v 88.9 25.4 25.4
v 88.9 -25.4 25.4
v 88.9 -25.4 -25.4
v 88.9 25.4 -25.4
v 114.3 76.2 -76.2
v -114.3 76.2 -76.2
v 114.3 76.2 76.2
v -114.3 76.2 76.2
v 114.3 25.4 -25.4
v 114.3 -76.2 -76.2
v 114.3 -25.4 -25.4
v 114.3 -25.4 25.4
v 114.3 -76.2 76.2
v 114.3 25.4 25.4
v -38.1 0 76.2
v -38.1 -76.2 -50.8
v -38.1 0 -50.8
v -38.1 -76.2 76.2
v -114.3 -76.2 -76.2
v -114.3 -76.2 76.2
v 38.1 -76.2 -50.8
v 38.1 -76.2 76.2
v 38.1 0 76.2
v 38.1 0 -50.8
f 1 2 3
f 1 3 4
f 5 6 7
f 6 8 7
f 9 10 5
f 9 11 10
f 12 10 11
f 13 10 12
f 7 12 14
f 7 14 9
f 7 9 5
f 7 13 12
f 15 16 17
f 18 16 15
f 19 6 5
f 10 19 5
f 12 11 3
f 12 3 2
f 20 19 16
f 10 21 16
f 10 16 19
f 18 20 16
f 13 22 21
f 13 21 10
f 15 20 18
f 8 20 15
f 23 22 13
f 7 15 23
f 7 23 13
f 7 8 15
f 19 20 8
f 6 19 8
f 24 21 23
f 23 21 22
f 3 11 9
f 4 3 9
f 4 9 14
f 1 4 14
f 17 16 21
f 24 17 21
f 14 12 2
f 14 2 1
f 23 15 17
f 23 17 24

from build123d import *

# Parameters (mm, degrees)
F0_W     = 228.6
F0_H     = 152.4
F1_DEPTH = 76.2
F2_W     = 50.8
F2_H     = 50.8
F3_DEPTH = 25.4
F4_W     = 76.2
F4_H     = 127
F5_DEPTH = 76.2


with BuildPart() as f1:
    # F0 (on Top) → F1 (new body, symmetric)
    with BuildSketch(Plane.XY):
        Rectangle(F0_W, F0_H)
    extrude(amount=F1_DEPTH, both=True)

    # F2 (on face) → F3 (cut)
    with BuildSketch(Plane.YZ.offset(114.3)):
        Rectangle(F2_W, F2_H)
    extrude(amount=-F3_DEPTH, mode=Mode.SUBTRACT)

    # F4 (on face) → F5 (cut)
    with BuildSketch(Plane.XZ.offset(76.2)):
        with Locations((0, 12.7)):
            Rectangle(F4_W, F4_H)
    extrude(amount=-F5_DEPTH, mode=Mode.SUBTRACT)


solid = f1.part
